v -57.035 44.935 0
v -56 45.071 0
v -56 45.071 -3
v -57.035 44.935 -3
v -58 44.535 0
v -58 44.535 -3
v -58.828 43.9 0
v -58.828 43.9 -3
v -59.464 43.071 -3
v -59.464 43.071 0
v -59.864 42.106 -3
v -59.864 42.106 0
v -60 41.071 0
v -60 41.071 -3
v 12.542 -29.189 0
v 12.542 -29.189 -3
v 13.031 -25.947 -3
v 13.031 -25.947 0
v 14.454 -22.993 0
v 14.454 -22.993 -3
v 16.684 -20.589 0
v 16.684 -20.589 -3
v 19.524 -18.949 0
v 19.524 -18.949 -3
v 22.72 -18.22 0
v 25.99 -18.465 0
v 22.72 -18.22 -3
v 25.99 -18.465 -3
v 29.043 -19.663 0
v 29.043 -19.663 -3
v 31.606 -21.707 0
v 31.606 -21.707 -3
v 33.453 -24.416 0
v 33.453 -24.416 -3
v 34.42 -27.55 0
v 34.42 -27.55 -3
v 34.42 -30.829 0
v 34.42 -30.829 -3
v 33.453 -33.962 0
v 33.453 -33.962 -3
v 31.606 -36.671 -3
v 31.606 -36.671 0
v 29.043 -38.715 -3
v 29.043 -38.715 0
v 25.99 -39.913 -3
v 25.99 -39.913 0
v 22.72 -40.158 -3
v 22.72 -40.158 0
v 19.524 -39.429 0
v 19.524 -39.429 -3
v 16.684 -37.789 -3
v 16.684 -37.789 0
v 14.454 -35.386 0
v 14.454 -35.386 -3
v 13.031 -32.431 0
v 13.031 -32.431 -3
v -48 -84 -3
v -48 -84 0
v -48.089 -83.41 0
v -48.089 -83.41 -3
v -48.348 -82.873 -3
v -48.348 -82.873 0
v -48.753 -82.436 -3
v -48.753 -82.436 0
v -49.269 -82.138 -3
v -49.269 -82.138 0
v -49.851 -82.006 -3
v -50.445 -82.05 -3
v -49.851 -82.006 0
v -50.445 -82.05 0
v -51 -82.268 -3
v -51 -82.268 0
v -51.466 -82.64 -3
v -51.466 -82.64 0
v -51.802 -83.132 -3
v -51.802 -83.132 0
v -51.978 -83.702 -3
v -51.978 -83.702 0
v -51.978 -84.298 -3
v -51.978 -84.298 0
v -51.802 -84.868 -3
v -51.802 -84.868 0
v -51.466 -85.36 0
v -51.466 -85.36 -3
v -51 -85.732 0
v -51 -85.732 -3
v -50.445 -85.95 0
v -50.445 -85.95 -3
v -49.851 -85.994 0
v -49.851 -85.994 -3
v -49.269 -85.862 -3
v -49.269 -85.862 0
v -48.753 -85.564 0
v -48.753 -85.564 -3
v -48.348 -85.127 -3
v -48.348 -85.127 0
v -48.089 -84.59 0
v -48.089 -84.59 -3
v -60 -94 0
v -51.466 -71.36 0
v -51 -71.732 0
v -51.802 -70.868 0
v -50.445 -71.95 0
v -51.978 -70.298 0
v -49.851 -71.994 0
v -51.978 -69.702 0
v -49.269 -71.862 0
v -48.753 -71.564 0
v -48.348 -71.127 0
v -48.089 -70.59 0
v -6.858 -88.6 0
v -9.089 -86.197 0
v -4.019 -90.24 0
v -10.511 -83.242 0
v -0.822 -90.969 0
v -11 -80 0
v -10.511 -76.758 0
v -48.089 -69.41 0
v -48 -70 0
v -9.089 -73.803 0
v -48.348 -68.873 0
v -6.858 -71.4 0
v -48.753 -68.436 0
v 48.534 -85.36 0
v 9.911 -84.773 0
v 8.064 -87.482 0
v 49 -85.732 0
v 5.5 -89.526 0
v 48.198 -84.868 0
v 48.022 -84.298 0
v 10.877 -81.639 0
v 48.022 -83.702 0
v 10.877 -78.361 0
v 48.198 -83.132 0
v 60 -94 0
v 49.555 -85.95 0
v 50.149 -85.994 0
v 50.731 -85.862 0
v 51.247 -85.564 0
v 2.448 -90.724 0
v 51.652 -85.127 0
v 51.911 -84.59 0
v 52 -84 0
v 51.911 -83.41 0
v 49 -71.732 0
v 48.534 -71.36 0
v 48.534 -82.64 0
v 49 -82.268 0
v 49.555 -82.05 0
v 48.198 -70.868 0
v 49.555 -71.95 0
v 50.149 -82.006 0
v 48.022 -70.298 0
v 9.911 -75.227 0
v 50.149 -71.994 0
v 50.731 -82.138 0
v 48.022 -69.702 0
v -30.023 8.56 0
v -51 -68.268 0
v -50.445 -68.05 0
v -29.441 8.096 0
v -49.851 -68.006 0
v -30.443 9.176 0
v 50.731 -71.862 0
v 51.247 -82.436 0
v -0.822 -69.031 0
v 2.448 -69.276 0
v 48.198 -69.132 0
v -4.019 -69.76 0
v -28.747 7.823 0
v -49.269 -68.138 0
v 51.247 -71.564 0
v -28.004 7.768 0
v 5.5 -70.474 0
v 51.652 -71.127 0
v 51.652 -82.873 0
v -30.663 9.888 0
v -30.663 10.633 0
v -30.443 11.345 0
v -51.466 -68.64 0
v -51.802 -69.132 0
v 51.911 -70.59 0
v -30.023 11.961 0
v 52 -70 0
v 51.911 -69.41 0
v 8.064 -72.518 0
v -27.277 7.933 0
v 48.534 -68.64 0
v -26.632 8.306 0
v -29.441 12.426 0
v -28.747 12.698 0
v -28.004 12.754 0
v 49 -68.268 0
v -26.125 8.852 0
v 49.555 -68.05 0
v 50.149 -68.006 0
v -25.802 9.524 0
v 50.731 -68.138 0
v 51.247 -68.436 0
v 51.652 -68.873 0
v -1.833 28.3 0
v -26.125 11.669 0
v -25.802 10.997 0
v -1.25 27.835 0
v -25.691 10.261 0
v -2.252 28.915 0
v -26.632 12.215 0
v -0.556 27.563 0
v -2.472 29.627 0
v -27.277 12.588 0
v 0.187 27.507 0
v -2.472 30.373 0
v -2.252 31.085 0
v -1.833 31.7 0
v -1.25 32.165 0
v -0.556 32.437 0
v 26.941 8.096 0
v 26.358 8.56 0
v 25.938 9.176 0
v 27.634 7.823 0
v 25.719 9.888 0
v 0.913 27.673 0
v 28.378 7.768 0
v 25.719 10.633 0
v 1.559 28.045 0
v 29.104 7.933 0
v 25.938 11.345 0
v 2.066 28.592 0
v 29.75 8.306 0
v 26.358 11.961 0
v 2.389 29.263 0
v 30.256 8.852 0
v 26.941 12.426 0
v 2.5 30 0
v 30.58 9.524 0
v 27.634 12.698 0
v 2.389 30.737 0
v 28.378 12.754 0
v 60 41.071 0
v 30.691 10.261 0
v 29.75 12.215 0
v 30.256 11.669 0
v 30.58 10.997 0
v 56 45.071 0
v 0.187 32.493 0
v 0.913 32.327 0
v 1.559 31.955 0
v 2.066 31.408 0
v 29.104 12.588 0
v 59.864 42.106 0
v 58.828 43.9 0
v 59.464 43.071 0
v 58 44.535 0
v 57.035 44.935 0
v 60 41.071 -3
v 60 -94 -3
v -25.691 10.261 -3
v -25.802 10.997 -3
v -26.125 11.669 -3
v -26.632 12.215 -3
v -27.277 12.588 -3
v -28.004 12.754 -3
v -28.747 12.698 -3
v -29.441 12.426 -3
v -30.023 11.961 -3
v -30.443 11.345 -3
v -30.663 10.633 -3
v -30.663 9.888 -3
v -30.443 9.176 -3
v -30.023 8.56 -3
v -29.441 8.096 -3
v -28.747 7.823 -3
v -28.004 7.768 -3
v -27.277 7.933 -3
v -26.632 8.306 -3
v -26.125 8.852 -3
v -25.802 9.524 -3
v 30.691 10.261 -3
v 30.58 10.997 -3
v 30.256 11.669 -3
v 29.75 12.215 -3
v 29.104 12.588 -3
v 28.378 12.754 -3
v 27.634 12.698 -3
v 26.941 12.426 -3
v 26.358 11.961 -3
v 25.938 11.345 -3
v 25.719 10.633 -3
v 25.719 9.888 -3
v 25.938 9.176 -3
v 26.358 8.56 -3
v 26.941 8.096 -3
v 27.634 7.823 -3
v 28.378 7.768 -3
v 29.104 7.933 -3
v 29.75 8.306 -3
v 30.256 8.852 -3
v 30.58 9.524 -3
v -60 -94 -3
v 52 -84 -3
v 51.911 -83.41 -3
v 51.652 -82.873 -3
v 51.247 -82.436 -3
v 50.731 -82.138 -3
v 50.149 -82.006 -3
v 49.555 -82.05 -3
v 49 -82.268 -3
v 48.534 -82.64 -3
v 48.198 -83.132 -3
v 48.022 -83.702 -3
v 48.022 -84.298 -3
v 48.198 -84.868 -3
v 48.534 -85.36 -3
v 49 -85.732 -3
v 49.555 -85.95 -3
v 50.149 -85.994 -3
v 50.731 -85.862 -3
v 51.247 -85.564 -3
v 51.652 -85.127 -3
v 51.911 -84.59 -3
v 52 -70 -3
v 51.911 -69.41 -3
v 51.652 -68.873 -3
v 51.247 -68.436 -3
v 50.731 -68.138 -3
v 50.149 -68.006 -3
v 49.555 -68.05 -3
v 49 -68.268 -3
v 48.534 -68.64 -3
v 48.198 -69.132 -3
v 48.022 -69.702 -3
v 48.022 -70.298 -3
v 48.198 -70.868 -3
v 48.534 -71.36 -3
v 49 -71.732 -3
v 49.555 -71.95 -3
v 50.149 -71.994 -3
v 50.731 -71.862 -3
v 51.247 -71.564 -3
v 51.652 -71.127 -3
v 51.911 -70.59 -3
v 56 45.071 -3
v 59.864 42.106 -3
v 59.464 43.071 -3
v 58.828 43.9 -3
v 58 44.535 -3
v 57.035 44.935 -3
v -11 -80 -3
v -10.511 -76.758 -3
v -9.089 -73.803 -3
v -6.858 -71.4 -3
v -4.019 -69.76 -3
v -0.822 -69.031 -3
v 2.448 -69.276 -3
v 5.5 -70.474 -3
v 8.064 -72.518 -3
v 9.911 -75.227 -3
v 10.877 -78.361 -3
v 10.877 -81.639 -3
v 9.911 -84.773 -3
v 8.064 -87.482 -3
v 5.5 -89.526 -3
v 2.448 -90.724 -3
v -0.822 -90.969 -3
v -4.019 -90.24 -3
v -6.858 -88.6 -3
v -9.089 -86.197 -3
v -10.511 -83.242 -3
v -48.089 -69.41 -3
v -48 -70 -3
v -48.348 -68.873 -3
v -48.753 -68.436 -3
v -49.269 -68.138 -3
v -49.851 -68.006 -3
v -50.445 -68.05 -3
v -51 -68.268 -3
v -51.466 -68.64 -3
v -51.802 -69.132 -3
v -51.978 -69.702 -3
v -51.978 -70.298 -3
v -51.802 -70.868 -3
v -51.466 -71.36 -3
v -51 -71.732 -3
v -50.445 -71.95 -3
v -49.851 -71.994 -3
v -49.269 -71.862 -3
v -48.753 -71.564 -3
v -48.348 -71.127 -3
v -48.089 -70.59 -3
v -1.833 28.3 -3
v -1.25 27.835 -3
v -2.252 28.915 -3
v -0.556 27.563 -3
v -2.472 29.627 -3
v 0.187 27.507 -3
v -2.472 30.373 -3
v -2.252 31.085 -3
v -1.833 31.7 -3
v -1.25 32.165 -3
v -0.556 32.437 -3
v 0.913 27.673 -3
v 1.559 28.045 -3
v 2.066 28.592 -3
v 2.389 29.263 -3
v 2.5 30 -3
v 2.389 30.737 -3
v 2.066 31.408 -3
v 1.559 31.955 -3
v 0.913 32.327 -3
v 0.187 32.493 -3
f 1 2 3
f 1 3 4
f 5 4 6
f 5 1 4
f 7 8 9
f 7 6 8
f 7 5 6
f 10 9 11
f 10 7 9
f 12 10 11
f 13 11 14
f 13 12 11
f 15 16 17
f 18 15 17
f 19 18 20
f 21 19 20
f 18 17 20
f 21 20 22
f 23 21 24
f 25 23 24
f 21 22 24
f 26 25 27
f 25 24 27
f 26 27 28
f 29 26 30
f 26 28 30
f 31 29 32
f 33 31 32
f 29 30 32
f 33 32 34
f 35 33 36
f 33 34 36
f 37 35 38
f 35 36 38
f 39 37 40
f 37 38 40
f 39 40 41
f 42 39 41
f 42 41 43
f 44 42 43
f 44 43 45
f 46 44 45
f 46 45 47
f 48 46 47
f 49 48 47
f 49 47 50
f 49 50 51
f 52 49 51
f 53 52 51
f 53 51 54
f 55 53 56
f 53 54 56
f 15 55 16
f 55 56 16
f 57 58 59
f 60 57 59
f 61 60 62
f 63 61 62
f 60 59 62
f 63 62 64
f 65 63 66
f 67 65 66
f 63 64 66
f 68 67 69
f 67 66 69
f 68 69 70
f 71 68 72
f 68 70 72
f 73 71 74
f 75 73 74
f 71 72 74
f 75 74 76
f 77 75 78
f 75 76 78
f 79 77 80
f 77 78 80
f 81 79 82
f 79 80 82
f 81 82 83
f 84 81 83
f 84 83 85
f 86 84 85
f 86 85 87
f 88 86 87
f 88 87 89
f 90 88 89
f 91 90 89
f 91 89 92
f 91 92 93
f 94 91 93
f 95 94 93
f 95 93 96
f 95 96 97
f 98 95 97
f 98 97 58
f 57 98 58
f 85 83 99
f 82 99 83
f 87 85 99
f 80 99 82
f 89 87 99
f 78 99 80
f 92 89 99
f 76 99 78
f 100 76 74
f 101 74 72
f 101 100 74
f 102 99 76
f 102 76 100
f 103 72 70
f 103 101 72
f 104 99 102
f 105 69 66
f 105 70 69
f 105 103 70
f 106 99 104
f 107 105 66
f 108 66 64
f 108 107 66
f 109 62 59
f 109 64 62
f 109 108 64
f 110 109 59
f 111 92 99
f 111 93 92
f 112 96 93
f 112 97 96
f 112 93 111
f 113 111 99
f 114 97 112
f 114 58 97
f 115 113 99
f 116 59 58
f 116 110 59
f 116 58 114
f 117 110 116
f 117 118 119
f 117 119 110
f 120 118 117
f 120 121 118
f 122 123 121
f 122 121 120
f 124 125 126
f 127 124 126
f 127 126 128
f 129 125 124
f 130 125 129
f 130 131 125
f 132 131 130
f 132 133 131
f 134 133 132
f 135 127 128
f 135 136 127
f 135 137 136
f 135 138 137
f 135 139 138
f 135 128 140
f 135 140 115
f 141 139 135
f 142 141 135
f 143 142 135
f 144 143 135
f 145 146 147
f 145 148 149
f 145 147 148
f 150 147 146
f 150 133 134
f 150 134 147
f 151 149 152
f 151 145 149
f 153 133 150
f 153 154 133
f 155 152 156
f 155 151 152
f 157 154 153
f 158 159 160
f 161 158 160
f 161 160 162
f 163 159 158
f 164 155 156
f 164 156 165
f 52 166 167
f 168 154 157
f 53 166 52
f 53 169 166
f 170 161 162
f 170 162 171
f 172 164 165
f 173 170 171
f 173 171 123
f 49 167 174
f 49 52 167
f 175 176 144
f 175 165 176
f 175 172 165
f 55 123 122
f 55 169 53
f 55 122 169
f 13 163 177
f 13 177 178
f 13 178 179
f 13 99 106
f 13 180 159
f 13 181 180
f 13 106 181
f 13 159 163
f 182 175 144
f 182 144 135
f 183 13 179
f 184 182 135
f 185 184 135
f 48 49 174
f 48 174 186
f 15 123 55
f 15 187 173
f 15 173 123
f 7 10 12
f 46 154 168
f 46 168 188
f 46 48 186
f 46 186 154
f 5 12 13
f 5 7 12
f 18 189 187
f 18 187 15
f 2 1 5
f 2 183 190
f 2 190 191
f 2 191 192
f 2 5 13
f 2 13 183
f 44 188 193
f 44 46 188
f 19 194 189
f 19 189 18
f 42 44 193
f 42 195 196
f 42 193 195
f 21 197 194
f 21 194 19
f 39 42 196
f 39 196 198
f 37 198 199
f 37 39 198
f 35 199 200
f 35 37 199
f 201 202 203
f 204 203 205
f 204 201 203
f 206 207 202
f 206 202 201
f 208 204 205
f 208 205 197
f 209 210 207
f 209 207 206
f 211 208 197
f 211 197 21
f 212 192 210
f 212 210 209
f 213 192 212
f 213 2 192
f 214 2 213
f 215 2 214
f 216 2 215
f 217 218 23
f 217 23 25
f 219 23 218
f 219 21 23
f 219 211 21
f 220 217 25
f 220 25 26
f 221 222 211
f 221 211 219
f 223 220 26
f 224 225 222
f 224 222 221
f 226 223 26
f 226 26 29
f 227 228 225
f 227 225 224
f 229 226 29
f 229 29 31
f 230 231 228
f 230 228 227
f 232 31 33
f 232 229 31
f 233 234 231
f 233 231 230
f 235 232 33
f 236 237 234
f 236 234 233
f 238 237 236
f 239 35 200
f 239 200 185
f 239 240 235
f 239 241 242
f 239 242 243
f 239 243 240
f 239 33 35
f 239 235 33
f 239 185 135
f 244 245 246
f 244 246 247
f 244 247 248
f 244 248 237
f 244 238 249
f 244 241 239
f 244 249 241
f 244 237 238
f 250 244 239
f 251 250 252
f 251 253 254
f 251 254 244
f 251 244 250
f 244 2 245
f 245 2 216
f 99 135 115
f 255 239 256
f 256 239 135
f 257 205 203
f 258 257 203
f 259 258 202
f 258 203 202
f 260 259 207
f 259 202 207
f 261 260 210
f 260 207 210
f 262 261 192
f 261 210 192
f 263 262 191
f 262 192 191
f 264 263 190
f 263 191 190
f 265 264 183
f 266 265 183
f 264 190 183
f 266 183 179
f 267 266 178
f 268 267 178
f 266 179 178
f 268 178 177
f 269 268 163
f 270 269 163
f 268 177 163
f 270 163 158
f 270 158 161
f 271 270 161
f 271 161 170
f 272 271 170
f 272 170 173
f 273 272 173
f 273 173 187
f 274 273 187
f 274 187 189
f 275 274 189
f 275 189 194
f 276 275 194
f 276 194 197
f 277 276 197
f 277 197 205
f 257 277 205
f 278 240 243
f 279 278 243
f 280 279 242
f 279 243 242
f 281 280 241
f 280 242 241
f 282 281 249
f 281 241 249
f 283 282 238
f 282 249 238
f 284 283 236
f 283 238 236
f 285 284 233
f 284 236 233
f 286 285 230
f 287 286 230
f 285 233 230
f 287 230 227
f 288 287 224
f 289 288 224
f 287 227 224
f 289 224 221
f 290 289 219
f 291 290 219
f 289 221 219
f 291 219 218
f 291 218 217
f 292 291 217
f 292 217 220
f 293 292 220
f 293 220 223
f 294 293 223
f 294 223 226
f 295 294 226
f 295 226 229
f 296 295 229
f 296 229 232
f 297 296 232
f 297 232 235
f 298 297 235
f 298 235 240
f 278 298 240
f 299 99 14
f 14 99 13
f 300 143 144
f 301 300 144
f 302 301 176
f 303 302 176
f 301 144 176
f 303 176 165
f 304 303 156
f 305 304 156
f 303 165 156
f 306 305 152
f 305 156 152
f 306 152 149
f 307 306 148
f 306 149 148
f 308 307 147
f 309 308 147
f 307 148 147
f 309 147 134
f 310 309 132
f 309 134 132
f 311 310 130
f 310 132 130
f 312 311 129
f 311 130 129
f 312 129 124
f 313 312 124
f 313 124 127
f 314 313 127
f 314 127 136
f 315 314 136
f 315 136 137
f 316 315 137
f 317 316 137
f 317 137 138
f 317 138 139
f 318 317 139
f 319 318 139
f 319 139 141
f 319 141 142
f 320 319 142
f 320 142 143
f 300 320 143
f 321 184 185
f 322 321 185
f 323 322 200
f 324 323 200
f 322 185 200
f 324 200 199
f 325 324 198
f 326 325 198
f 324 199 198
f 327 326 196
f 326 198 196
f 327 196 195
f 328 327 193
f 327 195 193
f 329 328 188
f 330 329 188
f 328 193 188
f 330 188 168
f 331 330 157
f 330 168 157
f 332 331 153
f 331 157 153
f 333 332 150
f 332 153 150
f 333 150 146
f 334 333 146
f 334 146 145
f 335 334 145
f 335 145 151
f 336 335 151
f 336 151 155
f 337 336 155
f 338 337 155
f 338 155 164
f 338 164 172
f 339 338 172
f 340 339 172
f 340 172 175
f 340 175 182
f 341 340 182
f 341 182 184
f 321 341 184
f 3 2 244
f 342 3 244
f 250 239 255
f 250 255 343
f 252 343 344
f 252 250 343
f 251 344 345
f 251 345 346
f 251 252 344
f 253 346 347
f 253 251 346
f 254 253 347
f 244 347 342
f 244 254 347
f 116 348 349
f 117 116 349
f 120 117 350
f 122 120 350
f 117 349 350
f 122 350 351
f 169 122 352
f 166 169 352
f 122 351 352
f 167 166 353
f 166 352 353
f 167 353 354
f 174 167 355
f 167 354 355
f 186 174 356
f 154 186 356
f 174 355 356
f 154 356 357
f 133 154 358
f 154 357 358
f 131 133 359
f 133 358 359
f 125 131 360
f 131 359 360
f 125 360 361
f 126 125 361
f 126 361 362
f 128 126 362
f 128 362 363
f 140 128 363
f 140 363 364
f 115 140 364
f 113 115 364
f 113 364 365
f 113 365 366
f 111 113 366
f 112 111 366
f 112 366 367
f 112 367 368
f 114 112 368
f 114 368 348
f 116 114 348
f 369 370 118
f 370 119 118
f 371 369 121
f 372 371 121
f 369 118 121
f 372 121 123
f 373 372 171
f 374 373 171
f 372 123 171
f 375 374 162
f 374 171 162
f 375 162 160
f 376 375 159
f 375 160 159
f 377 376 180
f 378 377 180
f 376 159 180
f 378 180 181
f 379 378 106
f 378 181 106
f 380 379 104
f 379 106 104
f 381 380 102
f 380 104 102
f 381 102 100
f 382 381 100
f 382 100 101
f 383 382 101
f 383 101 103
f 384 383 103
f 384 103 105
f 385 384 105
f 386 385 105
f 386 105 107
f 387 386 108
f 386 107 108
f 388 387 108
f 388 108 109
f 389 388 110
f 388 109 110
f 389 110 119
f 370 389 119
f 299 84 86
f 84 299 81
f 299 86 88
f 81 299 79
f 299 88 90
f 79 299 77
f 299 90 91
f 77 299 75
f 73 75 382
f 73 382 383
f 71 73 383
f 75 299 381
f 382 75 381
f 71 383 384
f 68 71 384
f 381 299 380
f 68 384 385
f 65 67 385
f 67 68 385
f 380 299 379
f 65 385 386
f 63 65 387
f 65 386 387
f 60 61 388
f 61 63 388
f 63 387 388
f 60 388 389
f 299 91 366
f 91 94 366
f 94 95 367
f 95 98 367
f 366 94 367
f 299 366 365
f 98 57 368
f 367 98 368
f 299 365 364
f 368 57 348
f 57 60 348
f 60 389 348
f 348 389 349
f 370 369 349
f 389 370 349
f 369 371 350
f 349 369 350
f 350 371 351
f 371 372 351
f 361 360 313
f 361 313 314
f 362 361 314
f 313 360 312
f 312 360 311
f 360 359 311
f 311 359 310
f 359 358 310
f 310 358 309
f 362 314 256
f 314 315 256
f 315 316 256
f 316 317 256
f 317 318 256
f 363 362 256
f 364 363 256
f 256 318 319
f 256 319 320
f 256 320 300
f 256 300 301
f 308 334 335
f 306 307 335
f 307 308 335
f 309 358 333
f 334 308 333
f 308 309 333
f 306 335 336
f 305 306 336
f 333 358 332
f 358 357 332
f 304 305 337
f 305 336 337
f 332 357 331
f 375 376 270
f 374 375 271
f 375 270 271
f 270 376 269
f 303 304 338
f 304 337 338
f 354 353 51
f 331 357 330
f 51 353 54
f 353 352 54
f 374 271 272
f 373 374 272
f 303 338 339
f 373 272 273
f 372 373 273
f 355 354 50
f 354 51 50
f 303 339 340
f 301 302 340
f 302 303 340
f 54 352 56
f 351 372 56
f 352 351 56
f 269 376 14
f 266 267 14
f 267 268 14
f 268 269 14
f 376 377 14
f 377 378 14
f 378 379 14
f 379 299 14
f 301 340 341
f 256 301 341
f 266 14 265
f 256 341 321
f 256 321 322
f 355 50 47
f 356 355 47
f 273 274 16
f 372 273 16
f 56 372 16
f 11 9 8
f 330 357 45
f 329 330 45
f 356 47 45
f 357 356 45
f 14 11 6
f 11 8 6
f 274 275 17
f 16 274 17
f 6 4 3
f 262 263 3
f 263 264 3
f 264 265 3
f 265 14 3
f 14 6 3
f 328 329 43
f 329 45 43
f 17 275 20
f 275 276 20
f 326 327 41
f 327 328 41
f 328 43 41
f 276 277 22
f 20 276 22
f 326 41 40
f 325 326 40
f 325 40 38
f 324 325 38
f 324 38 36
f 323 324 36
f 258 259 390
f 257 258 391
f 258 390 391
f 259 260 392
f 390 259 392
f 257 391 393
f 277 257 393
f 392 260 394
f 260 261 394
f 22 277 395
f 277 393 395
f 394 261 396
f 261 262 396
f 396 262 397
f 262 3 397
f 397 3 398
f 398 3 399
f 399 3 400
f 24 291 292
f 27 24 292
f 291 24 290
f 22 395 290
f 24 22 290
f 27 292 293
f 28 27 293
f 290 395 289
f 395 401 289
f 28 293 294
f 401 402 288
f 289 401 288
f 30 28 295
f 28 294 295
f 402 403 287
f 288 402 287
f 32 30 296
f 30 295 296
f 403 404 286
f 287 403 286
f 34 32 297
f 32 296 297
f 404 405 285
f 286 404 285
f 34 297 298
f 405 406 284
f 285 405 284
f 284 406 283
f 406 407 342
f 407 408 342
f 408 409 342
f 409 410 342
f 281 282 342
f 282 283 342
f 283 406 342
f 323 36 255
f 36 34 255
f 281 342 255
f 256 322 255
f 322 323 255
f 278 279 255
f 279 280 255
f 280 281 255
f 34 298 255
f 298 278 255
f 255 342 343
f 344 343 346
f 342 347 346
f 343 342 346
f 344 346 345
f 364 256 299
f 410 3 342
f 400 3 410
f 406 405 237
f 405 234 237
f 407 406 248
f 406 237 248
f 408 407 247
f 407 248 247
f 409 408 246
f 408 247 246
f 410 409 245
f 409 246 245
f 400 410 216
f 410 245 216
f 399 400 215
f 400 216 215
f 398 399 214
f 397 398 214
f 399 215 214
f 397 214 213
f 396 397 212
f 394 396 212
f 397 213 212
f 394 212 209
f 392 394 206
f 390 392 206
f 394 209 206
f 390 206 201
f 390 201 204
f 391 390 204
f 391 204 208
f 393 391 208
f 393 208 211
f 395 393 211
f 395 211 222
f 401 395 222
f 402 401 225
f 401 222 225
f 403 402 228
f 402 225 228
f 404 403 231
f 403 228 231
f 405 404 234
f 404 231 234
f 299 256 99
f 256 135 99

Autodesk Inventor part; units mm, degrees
ref_plane "YZ Plane" through (0, 0, 0) normal (1, 0, 0) x (0, 1, 0)
ref_plane "XZ Plane" through (0, 0, 0) normal (0, 1, 0) x (-1, 0, 0)
ref_plane "XY Plane" through (0, 0, 0) normal (0, 0, 1) x (1, 0, 0)
sketch "スケッチ1" plane through (0, 0, 0) normal (0, 0, 1) x (1, 0, 0)
  circle A0 centre (0, 0) radius 7.5
  circle A1 centre (0, 0) radius 30
  circle A2 centre (0, 0) radius 37.5
  circle A3 centre (23.5425, -29.1891) radius 30
  circle A4 centre (23.5425, -29.1891) radius 4
  circle A5 centre (23.5425, -29.1891) radius 16
  circle A6 centre (23.5425, -29.1891) radius 56
  circle A7 centre (0, -80) radius 40
  circle A8 centre (0, -80) radius 50
  circle A9 centre (0, -80) radius 4
  dimension "d57" = 75
  dimension "d64" = 112
  dimension "d41" = 15
  dimension "d58" = 8
  dimension "d63" = 32
  dimension "d65" = 100
  dimension "d66" = 8
sketch "スケッチ2" plane through (0, 0, 0) normal (0, 0, 1) x (1, 0, 0)
  line L0 (0, 0) -> (24.502, 0) construction
  line L1 (0, 0) -> (12.5, 0) construction
  line L2 (0, 0) -> (10.253, 10.253)
  line L3 (0, 0) -> (14.5, 0) construction
  line L4 (10.253, 10.253) -> (-10.253, -10.253)
  circle A0 centre (10.253, 10.253) radius 2
  circle A1 centre (-10.253, -10.253) radius 2
  circle A2 centre (0, 0) radius 7.5
  line L5 (0, 0) -> (28.1908, 10.2606)
  line L6 (0, 0) -> (30, 0) construction
  line L7 (0, 0) -> (-28.1908, 10.2606)
  line L8 (0, 0) -> (30, 0) construction
  circle A3 centre (-28.1908, 10.2606) radius 2.5
  line L9 (0, 0) -> (0, 30)
  circle A4 centre (0, 30) radius 2.5
  circle A5 centre (28.1908, 10.2606) radius 2.5
  dimension "d9" = 14.5
  dimension "d10" = 45
  dimension "d11" = 29
  dimension "d12" = 4
  dimension "d13" = 4
  dimension "d14" = 15
  dimension "d15" = 30
  dimension "d16" = 20
  dimension "d17" = 30
  dimension "d18" = 160
  dimension "d19" = 5
  dimension "d20" = 30
  dimension "d21" = 5
  dimension "d22" = 5
sketch "スケッチ3" plane through (0, 0, 0) normal (0, 0, 1) x (1, 0, 0)
  line L0 (60, -99.3436) -> (-60, -99.3436)
  line L1 (-60, -99.3436) -> (-60, 99.3436)
  line L2 (-60, 99.3436) -> (60, 99.3436)
  line L3 (60, 99.3436) -> (60, -99.3436)
  line L4 (60, -99.3436) -> (-60, 99.3436) construction
  line L5 (-60, -99.3436) -> (60, 99.3436) construction
  point P0 (0, 0)
  dimension "d25" = 120
extrude "押し出し1" add sketch "スケッチ3" against normal blind 3
sketch "スケッチ4" plane through (0, 0, 0) normal (0, 0, 1) x (1, 0, 0)
  line L0 (0, 45.0711) -> (68.3595, 45.0711)
  line L1 (68.3595, 45.0711) -> (-74.3824, 45.0711)
  line L2 (-74.3824, 45.0711) -> (108.1656, 45.0711)
  line L3 (108.1656, 45.0711) -> (108.1656, 129.4154)
  line L4 (108.1656, 129.4154) -> (-74.3824, 129.4154)
  line L5 (-74.3824, 129.4154) -> (-74.3824, 45.0711)
  point P0 (0, 0)
extrude "押し出し4" cut sketch "スケッチ4" against normal blind 10
fillet "フィレット1" radius 4 4 edges at (-60, 45.0711, -1.5) (60, 45.0711, -1.5) (-60, -99.3436, -1.5) (60, -99.3436, -1.5)
extrude "押し出し9" cut sketch "スケッチ1" against normal blind 10 contours A4 A2 | A2 A4 | A9 A6 | A6 A9
sketch "スケッチ8" plane through (0, 0, 0) normal (0, 0, 1) x (1, 0, 0)
  line L0 (-265.6992, -158.784) -> (100.3409, -158.784)
  line L1 (100.3409, -158.784) -> (100.3409, -94)
  line L2 (100.3409, -94) -> (-265.6992, -94)
  line L3 (-265.6992, -94) -> (-265.6992, -158.784)
  line L4 (-265.6992, -158.784) -> (100.3409, -94) construction
  line L5 (100.3409, -158.784) -> (-265.6992, -94) construction
  point P0 (0, 0)
  point P1 (0, -94)
  point P2 (-82.6791, -126.392)
extrude "押し出し10" cut sketch "スケッチ8" against normal blind 10
extrude "押し出し11" cut sketch "スケッチ2" against normal blind 10 contours A5 | A3 | A4
sketch "スケッチ9" plane through (0, 0, 0) normal (0, 0, 1) x (1, 0, 0)
  circle A0 centre (-50, -84) radius 2
  circle A1 centre (50, -84) radius 2
  circle A2 centre (-50, -70) radius 2
  circle A3 centre (50, -70) radius 2
  point P0 (0, 0)
  dimension "d73" = 4
  dimension "d74" = 4
  dimension "d75" = 4
  dimension "d76" = 4
extrude "押し出し12" cut sketch "スケッチ9" against normal blind 10
sketch "スケッチ10" plane through (0, 0, -3) normal (0, 0, -1) x (-1, 0, 0)
  circle A0 centre (-23.5425, -29.1891) radius 4 projected
  circle A1 centre (-23.5425, -29.1891) radius 11
  circle A2 centre (0, -80) radius 4 projected
  circle A3 centre (0, -80) radius 11
  point P0 (0, 0)
  dimension "d79" = 22
  dimension "d80" = 22
extrude "押し出し13" cut sketch "スケッチ10" against normal blind 10
properties part number "板2" material "アルミニウム 6061"
